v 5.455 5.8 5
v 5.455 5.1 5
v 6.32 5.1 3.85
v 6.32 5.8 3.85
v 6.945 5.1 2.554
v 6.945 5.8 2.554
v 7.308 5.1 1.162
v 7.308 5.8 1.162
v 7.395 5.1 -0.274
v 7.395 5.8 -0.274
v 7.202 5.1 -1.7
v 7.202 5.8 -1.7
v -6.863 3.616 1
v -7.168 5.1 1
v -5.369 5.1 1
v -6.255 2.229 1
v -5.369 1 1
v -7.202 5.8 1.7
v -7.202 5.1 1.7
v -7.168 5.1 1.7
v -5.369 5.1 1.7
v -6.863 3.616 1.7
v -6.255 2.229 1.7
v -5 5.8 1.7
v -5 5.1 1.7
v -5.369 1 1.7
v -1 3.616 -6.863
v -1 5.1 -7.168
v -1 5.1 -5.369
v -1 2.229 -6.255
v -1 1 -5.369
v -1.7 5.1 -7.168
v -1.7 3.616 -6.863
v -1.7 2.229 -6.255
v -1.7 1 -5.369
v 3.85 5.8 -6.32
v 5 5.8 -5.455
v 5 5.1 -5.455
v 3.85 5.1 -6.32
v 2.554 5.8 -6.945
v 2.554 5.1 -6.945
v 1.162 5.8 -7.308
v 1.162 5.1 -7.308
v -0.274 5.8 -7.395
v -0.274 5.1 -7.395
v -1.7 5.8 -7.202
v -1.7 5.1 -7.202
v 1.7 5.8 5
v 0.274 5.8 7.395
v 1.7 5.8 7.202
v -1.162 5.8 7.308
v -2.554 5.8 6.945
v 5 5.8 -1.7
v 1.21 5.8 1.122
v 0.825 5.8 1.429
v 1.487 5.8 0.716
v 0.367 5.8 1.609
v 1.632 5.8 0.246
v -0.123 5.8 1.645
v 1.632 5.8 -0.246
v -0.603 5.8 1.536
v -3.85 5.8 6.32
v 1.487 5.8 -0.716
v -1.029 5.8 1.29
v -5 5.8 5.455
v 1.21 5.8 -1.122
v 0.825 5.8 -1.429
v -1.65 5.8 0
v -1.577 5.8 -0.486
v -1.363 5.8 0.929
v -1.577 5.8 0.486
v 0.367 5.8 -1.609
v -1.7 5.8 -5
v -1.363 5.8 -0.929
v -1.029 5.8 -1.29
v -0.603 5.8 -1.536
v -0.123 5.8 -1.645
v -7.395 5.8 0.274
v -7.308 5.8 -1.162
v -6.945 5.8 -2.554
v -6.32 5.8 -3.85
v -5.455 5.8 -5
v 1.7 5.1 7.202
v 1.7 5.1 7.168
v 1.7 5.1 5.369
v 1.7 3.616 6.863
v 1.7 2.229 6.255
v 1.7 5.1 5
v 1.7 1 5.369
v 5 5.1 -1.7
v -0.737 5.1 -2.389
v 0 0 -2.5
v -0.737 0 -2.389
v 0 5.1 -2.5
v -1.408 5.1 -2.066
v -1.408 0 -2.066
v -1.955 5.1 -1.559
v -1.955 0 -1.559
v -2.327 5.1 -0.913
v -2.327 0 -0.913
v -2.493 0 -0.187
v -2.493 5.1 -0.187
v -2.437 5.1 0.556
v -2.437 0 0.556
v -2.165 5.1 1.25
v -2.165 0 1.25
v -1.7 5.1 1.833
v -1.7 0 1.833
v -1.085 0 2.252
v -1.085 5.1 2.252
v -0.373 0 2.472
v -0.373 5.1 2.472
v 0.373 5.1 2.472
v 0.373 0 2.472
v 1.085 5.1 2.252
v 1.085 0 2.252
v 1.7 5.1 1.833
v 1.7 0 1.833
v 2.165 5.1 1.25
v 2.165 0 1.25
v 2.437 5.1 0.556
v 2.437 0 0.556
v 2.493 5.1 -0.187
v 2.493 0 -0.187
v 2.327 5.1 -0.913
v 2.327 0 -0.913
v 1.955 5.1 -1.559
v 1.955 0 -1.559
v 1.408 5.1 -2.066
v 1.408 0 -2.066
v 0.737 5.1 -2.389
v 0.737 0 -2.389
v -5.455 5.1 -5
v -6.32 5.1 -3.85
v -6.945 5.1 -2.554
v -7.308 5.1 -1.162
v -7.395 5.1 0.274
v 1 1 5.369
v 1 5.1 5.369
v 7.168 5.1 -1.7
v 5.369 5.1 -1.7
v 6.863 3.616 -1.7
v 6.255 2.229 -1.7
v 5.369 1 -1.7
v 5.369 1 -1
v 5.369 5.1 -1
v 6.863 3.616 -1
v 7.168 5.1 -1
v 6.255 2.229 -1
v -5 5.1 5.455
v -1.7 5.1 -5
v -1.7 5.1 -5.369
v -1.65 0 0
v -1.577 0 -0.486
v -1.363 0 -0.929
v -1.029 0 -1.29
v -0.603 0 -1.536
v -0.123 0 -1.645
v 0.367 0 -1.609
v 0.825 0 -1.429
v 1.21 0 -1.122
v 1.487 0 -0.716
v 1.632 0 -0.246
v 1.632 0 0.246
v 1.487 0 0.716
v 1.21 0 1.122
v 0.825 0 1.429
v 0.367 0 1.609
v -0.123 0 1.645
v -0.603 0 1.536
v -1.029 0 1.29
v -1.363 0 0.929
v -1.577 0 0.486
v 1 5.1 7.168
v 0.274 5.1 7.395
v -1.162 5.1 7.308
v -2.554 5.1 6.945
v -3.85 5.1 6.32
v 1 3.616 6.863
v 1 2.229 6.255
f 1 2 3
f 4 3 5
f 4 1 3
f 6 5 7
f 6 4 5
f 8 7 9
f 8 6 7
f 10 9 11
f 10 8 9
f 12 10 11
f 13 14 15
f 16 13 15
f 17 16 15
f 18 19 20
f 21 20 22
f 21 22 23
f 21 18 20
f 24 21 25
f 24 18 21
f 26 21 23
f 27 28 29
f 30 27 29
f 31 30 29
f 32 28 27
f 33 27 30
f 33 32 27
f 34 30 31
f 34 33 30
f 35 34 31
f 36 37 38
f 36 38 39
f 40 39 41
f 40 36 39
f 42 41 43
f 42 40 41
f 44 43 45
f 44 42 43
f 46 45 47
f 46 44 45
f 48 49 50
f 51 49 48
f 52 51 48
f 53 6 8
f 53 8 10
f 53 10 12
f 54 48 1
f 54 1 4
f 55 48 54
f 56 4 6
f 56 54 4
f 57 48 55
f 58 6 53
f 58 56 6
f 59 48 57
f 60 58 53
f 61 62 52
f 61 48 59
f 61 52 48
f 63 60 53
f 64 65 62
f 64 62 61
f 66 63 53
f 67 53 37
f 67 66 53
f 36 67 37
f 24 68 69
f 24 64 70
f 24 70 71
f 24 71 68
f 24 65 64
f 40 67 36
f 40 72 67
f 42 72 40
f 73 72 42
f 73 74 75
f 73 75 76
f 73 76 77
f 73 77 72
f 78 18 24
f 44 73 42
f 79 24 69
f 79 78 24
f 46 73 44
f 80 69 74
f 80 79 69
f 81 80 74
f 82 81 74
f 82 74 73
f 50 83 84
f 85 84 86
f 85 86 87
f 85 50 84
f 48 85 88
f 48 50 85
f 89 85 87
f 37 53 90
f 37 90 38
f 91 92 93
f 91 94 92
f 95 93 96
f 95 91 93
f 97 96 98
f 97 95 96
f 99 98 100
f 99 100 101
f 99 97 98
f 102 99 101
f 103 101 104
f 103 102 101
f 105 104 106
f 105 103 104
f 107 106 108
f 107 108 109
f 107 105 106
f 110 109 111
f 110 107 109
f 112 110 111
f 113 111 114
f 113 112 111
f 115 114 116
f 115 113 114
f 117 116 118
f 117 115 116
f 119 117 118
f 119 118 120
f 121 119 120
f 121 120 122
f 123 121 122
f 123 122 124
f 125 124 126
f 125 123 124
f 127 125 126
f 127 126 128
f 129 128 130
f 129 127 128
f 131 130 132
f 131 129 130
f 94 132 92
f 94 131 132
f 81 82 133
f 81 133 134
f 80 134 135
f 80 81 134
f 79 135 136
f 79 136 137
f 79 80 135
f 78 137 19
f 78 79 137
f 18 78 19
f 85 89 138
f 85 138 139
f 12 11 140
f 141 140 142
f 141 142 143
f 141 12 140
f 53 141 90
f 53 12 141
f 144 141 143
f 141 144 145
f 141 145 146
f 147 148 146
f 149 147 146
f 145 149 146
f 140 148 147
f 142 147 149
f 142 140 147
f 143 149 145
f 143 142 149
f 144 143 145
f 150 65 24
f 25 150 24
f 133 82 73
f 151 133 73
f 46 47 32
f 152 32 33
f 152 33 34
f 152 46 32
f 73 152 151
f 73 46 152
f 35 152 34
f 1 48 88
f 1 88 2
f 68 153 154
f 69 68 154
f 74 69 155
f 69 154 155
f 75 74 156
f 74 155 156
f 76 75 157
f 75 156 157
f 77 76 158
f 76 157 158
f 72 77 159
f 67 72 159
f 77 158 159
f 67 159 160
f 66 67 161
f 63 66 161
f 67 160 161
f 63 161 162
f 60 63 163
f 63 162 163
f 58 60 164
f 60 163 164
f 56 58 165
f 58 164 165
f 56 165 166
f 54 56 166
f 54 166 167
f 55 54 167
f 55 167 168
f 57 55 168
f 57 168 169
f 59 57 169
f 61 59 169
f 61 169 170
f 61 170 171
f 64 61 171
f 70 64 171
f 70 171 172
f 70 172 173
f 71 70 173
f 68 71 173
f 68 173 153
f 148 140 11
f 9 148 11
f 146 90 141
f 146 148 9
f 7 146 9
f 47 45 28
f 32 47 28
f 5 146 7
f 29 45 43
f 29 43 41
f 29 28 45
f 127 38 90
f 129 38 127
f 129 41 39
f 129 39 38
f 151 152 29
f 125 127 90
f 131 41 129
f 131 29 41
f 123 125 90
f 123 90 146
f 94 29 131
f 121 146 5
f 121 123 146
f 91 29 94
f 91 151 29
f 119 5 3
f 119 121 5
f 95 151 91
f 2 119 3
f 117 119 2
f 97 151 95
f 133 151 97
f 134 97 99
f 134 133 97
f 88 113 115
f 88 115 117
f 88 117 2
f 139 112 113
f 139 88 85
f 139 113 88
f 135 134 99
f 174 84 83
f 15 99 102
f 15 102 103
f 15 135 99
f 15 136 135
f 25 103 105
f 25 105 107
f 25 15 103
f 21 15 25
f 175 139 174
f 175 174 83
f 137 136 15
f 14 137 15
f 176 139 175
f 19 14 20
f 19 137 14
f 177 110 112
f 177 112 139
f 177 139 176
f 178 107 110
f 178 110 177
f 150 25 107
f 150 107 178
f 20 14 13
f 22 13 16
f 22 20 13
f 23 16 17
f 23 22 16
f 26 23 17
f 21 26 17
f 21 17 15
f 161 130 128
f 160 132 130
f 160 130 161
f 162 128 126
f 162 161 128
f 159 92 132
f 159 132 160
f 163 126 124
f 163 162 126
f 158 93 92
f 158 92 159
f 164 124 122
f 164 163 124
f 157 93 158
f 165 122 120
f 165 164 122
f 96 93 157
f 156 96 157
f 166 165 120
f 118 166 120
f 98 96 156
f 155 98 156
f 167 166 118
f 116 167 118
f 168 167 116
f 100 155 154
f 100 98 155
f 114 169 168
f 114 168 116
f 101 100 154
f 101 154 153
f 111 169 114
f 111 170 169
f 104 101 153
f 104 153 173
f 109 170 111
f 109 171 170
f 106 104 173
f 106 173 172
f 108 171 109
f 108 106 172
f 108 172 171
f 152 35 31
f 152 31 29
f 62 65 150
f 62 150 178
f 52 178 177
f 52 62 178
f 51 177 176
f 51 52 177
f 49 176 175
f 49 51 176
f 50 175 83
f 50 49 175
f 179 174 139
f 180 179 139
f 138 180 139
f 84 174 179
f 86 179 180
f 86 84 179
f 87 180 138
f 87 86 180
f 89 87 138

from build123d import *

# Parameters (mm, degrees)
TROU_TARAUD_M41_D            = 3.3
TROU_TARAUD_M41_DEPTH        = 11.5
TROU_TARAUD_M41_TIP          = 0.991420021
ESQUISSE4_W                  = 5.010008652
ESQUISSE4_H                  = 3.395361839
ESQUISSE4_W_2                = 3.395361839
ESQUISSE4_H_2                = 5.010008652
ENL_V_MAT_EXTRU_1_DEPTH      = 10
BOSS_EXTRU_1_DEPTH           = 0.7
R_P_TITION_CIRCULAIRE1_COUNT = 4


with BuildPart() as part:
    # Esquisse1 → Révolution1 (revolve)
    with BuildSketch(Plane.XY, mode=Mode.PRIVATE) as r_volution1_sk:
        Polygon((0, 0), (2.5, 0), (2.5, 5.1), (7.4, 5.1), (7.4, 5.8), (0, 5.8), align=None)
    revolve(r_volution1_sk.sketch.rotate(Axis((0, 0, 0), (0, 1, 0)), 90), axis=Axis((0, 0, 0), (0, 1, 0)))

    # Trou taraudé M41
    with Locations(Plane(origin=(0, 5.8, 0), x_dir=(1, 0, 0), z_dir=(0, 1, 0))):
        with Locations((0, 0)):
            Hole(TROU_TARAUD_M41_D / 2, depth=TROU_TARAUD_M41_DEPTH)
            with Locations((0, 0, -(TROU_TARAUD_M41_DEPTH + TROU_TARAUD_M41_TIP / 2))):  # 118° drill point
                Cone(0, TROU_TARAUD_M41_D / 2, TROU_TARAUD_M41_TIP, mode=Mode.SUBTRACT)

    # Esquisse4 → Enlèv. mat.-Extru.1 (cut)
    with BuildSketch(Plane(origin=(0, 5.8, 0), x_dir=(1, 0, 0), z_dir=(0, 1, 0))):
        with Locations((4.205004326, -6.69768092)):
            Rectangle(ESQUISSE4_W, ESQUISSE4_H)
        with Locations((6.69768092, 4.205004326)):
            Rectangle(ESQUISSE4_W_2, ESQUISSE4_H_2)
        with Locations((-6.69768092, -4.205004326)):
            Rectangle(ESQUISSE4_W_2, ESQUISSE4_H_2)
        with Locations((-4.205004326, 6.69768092)):
            Rectangle(ESQUISSE4_W, ESQUISSE4_H)
    extrude(amount=-ENL_V_MAT_EXTRU_1_DEPTH, mode=Mode.SUBTRACT)

    # Esquisse5 → Boss.-Extru.1 (add)
    with BuildSketch(Plane(origin=(0, 0, -1.7), x_dir=(-1, 0, 0), z_dir=(0, 0, -1))):
        with BuildLine():
            Line((-5.369357503, 1), (-5.369357503, 5.8))
            Line((-5.369357503, 5.8), (-7.202083032, 5.8))
            ThreePointArc((-7.202083032, 5.8), (-6.728319202, 3.23100784), (-5.369357503, 1))
        make_face()
    boss_extru_1 = extrude(amount=-BOSS_EXTRU_1_DEPTH)

    # Répétition circulaire1: Boss.-Extru.1 ×4 about axis
    r_p_tition_circulaire1_axis = Axis((0, 0, 0), (0, 1, 0))
    for i in range(1, R_P_TITION_CIRCULAIRE1_COUNT):
        add(boss_extru_1.rotate(r_p_tition_circulaire1_axis, i * 360 / R_P_TITION_CIRCULAIRE1_COUNT))


solid = part.part
